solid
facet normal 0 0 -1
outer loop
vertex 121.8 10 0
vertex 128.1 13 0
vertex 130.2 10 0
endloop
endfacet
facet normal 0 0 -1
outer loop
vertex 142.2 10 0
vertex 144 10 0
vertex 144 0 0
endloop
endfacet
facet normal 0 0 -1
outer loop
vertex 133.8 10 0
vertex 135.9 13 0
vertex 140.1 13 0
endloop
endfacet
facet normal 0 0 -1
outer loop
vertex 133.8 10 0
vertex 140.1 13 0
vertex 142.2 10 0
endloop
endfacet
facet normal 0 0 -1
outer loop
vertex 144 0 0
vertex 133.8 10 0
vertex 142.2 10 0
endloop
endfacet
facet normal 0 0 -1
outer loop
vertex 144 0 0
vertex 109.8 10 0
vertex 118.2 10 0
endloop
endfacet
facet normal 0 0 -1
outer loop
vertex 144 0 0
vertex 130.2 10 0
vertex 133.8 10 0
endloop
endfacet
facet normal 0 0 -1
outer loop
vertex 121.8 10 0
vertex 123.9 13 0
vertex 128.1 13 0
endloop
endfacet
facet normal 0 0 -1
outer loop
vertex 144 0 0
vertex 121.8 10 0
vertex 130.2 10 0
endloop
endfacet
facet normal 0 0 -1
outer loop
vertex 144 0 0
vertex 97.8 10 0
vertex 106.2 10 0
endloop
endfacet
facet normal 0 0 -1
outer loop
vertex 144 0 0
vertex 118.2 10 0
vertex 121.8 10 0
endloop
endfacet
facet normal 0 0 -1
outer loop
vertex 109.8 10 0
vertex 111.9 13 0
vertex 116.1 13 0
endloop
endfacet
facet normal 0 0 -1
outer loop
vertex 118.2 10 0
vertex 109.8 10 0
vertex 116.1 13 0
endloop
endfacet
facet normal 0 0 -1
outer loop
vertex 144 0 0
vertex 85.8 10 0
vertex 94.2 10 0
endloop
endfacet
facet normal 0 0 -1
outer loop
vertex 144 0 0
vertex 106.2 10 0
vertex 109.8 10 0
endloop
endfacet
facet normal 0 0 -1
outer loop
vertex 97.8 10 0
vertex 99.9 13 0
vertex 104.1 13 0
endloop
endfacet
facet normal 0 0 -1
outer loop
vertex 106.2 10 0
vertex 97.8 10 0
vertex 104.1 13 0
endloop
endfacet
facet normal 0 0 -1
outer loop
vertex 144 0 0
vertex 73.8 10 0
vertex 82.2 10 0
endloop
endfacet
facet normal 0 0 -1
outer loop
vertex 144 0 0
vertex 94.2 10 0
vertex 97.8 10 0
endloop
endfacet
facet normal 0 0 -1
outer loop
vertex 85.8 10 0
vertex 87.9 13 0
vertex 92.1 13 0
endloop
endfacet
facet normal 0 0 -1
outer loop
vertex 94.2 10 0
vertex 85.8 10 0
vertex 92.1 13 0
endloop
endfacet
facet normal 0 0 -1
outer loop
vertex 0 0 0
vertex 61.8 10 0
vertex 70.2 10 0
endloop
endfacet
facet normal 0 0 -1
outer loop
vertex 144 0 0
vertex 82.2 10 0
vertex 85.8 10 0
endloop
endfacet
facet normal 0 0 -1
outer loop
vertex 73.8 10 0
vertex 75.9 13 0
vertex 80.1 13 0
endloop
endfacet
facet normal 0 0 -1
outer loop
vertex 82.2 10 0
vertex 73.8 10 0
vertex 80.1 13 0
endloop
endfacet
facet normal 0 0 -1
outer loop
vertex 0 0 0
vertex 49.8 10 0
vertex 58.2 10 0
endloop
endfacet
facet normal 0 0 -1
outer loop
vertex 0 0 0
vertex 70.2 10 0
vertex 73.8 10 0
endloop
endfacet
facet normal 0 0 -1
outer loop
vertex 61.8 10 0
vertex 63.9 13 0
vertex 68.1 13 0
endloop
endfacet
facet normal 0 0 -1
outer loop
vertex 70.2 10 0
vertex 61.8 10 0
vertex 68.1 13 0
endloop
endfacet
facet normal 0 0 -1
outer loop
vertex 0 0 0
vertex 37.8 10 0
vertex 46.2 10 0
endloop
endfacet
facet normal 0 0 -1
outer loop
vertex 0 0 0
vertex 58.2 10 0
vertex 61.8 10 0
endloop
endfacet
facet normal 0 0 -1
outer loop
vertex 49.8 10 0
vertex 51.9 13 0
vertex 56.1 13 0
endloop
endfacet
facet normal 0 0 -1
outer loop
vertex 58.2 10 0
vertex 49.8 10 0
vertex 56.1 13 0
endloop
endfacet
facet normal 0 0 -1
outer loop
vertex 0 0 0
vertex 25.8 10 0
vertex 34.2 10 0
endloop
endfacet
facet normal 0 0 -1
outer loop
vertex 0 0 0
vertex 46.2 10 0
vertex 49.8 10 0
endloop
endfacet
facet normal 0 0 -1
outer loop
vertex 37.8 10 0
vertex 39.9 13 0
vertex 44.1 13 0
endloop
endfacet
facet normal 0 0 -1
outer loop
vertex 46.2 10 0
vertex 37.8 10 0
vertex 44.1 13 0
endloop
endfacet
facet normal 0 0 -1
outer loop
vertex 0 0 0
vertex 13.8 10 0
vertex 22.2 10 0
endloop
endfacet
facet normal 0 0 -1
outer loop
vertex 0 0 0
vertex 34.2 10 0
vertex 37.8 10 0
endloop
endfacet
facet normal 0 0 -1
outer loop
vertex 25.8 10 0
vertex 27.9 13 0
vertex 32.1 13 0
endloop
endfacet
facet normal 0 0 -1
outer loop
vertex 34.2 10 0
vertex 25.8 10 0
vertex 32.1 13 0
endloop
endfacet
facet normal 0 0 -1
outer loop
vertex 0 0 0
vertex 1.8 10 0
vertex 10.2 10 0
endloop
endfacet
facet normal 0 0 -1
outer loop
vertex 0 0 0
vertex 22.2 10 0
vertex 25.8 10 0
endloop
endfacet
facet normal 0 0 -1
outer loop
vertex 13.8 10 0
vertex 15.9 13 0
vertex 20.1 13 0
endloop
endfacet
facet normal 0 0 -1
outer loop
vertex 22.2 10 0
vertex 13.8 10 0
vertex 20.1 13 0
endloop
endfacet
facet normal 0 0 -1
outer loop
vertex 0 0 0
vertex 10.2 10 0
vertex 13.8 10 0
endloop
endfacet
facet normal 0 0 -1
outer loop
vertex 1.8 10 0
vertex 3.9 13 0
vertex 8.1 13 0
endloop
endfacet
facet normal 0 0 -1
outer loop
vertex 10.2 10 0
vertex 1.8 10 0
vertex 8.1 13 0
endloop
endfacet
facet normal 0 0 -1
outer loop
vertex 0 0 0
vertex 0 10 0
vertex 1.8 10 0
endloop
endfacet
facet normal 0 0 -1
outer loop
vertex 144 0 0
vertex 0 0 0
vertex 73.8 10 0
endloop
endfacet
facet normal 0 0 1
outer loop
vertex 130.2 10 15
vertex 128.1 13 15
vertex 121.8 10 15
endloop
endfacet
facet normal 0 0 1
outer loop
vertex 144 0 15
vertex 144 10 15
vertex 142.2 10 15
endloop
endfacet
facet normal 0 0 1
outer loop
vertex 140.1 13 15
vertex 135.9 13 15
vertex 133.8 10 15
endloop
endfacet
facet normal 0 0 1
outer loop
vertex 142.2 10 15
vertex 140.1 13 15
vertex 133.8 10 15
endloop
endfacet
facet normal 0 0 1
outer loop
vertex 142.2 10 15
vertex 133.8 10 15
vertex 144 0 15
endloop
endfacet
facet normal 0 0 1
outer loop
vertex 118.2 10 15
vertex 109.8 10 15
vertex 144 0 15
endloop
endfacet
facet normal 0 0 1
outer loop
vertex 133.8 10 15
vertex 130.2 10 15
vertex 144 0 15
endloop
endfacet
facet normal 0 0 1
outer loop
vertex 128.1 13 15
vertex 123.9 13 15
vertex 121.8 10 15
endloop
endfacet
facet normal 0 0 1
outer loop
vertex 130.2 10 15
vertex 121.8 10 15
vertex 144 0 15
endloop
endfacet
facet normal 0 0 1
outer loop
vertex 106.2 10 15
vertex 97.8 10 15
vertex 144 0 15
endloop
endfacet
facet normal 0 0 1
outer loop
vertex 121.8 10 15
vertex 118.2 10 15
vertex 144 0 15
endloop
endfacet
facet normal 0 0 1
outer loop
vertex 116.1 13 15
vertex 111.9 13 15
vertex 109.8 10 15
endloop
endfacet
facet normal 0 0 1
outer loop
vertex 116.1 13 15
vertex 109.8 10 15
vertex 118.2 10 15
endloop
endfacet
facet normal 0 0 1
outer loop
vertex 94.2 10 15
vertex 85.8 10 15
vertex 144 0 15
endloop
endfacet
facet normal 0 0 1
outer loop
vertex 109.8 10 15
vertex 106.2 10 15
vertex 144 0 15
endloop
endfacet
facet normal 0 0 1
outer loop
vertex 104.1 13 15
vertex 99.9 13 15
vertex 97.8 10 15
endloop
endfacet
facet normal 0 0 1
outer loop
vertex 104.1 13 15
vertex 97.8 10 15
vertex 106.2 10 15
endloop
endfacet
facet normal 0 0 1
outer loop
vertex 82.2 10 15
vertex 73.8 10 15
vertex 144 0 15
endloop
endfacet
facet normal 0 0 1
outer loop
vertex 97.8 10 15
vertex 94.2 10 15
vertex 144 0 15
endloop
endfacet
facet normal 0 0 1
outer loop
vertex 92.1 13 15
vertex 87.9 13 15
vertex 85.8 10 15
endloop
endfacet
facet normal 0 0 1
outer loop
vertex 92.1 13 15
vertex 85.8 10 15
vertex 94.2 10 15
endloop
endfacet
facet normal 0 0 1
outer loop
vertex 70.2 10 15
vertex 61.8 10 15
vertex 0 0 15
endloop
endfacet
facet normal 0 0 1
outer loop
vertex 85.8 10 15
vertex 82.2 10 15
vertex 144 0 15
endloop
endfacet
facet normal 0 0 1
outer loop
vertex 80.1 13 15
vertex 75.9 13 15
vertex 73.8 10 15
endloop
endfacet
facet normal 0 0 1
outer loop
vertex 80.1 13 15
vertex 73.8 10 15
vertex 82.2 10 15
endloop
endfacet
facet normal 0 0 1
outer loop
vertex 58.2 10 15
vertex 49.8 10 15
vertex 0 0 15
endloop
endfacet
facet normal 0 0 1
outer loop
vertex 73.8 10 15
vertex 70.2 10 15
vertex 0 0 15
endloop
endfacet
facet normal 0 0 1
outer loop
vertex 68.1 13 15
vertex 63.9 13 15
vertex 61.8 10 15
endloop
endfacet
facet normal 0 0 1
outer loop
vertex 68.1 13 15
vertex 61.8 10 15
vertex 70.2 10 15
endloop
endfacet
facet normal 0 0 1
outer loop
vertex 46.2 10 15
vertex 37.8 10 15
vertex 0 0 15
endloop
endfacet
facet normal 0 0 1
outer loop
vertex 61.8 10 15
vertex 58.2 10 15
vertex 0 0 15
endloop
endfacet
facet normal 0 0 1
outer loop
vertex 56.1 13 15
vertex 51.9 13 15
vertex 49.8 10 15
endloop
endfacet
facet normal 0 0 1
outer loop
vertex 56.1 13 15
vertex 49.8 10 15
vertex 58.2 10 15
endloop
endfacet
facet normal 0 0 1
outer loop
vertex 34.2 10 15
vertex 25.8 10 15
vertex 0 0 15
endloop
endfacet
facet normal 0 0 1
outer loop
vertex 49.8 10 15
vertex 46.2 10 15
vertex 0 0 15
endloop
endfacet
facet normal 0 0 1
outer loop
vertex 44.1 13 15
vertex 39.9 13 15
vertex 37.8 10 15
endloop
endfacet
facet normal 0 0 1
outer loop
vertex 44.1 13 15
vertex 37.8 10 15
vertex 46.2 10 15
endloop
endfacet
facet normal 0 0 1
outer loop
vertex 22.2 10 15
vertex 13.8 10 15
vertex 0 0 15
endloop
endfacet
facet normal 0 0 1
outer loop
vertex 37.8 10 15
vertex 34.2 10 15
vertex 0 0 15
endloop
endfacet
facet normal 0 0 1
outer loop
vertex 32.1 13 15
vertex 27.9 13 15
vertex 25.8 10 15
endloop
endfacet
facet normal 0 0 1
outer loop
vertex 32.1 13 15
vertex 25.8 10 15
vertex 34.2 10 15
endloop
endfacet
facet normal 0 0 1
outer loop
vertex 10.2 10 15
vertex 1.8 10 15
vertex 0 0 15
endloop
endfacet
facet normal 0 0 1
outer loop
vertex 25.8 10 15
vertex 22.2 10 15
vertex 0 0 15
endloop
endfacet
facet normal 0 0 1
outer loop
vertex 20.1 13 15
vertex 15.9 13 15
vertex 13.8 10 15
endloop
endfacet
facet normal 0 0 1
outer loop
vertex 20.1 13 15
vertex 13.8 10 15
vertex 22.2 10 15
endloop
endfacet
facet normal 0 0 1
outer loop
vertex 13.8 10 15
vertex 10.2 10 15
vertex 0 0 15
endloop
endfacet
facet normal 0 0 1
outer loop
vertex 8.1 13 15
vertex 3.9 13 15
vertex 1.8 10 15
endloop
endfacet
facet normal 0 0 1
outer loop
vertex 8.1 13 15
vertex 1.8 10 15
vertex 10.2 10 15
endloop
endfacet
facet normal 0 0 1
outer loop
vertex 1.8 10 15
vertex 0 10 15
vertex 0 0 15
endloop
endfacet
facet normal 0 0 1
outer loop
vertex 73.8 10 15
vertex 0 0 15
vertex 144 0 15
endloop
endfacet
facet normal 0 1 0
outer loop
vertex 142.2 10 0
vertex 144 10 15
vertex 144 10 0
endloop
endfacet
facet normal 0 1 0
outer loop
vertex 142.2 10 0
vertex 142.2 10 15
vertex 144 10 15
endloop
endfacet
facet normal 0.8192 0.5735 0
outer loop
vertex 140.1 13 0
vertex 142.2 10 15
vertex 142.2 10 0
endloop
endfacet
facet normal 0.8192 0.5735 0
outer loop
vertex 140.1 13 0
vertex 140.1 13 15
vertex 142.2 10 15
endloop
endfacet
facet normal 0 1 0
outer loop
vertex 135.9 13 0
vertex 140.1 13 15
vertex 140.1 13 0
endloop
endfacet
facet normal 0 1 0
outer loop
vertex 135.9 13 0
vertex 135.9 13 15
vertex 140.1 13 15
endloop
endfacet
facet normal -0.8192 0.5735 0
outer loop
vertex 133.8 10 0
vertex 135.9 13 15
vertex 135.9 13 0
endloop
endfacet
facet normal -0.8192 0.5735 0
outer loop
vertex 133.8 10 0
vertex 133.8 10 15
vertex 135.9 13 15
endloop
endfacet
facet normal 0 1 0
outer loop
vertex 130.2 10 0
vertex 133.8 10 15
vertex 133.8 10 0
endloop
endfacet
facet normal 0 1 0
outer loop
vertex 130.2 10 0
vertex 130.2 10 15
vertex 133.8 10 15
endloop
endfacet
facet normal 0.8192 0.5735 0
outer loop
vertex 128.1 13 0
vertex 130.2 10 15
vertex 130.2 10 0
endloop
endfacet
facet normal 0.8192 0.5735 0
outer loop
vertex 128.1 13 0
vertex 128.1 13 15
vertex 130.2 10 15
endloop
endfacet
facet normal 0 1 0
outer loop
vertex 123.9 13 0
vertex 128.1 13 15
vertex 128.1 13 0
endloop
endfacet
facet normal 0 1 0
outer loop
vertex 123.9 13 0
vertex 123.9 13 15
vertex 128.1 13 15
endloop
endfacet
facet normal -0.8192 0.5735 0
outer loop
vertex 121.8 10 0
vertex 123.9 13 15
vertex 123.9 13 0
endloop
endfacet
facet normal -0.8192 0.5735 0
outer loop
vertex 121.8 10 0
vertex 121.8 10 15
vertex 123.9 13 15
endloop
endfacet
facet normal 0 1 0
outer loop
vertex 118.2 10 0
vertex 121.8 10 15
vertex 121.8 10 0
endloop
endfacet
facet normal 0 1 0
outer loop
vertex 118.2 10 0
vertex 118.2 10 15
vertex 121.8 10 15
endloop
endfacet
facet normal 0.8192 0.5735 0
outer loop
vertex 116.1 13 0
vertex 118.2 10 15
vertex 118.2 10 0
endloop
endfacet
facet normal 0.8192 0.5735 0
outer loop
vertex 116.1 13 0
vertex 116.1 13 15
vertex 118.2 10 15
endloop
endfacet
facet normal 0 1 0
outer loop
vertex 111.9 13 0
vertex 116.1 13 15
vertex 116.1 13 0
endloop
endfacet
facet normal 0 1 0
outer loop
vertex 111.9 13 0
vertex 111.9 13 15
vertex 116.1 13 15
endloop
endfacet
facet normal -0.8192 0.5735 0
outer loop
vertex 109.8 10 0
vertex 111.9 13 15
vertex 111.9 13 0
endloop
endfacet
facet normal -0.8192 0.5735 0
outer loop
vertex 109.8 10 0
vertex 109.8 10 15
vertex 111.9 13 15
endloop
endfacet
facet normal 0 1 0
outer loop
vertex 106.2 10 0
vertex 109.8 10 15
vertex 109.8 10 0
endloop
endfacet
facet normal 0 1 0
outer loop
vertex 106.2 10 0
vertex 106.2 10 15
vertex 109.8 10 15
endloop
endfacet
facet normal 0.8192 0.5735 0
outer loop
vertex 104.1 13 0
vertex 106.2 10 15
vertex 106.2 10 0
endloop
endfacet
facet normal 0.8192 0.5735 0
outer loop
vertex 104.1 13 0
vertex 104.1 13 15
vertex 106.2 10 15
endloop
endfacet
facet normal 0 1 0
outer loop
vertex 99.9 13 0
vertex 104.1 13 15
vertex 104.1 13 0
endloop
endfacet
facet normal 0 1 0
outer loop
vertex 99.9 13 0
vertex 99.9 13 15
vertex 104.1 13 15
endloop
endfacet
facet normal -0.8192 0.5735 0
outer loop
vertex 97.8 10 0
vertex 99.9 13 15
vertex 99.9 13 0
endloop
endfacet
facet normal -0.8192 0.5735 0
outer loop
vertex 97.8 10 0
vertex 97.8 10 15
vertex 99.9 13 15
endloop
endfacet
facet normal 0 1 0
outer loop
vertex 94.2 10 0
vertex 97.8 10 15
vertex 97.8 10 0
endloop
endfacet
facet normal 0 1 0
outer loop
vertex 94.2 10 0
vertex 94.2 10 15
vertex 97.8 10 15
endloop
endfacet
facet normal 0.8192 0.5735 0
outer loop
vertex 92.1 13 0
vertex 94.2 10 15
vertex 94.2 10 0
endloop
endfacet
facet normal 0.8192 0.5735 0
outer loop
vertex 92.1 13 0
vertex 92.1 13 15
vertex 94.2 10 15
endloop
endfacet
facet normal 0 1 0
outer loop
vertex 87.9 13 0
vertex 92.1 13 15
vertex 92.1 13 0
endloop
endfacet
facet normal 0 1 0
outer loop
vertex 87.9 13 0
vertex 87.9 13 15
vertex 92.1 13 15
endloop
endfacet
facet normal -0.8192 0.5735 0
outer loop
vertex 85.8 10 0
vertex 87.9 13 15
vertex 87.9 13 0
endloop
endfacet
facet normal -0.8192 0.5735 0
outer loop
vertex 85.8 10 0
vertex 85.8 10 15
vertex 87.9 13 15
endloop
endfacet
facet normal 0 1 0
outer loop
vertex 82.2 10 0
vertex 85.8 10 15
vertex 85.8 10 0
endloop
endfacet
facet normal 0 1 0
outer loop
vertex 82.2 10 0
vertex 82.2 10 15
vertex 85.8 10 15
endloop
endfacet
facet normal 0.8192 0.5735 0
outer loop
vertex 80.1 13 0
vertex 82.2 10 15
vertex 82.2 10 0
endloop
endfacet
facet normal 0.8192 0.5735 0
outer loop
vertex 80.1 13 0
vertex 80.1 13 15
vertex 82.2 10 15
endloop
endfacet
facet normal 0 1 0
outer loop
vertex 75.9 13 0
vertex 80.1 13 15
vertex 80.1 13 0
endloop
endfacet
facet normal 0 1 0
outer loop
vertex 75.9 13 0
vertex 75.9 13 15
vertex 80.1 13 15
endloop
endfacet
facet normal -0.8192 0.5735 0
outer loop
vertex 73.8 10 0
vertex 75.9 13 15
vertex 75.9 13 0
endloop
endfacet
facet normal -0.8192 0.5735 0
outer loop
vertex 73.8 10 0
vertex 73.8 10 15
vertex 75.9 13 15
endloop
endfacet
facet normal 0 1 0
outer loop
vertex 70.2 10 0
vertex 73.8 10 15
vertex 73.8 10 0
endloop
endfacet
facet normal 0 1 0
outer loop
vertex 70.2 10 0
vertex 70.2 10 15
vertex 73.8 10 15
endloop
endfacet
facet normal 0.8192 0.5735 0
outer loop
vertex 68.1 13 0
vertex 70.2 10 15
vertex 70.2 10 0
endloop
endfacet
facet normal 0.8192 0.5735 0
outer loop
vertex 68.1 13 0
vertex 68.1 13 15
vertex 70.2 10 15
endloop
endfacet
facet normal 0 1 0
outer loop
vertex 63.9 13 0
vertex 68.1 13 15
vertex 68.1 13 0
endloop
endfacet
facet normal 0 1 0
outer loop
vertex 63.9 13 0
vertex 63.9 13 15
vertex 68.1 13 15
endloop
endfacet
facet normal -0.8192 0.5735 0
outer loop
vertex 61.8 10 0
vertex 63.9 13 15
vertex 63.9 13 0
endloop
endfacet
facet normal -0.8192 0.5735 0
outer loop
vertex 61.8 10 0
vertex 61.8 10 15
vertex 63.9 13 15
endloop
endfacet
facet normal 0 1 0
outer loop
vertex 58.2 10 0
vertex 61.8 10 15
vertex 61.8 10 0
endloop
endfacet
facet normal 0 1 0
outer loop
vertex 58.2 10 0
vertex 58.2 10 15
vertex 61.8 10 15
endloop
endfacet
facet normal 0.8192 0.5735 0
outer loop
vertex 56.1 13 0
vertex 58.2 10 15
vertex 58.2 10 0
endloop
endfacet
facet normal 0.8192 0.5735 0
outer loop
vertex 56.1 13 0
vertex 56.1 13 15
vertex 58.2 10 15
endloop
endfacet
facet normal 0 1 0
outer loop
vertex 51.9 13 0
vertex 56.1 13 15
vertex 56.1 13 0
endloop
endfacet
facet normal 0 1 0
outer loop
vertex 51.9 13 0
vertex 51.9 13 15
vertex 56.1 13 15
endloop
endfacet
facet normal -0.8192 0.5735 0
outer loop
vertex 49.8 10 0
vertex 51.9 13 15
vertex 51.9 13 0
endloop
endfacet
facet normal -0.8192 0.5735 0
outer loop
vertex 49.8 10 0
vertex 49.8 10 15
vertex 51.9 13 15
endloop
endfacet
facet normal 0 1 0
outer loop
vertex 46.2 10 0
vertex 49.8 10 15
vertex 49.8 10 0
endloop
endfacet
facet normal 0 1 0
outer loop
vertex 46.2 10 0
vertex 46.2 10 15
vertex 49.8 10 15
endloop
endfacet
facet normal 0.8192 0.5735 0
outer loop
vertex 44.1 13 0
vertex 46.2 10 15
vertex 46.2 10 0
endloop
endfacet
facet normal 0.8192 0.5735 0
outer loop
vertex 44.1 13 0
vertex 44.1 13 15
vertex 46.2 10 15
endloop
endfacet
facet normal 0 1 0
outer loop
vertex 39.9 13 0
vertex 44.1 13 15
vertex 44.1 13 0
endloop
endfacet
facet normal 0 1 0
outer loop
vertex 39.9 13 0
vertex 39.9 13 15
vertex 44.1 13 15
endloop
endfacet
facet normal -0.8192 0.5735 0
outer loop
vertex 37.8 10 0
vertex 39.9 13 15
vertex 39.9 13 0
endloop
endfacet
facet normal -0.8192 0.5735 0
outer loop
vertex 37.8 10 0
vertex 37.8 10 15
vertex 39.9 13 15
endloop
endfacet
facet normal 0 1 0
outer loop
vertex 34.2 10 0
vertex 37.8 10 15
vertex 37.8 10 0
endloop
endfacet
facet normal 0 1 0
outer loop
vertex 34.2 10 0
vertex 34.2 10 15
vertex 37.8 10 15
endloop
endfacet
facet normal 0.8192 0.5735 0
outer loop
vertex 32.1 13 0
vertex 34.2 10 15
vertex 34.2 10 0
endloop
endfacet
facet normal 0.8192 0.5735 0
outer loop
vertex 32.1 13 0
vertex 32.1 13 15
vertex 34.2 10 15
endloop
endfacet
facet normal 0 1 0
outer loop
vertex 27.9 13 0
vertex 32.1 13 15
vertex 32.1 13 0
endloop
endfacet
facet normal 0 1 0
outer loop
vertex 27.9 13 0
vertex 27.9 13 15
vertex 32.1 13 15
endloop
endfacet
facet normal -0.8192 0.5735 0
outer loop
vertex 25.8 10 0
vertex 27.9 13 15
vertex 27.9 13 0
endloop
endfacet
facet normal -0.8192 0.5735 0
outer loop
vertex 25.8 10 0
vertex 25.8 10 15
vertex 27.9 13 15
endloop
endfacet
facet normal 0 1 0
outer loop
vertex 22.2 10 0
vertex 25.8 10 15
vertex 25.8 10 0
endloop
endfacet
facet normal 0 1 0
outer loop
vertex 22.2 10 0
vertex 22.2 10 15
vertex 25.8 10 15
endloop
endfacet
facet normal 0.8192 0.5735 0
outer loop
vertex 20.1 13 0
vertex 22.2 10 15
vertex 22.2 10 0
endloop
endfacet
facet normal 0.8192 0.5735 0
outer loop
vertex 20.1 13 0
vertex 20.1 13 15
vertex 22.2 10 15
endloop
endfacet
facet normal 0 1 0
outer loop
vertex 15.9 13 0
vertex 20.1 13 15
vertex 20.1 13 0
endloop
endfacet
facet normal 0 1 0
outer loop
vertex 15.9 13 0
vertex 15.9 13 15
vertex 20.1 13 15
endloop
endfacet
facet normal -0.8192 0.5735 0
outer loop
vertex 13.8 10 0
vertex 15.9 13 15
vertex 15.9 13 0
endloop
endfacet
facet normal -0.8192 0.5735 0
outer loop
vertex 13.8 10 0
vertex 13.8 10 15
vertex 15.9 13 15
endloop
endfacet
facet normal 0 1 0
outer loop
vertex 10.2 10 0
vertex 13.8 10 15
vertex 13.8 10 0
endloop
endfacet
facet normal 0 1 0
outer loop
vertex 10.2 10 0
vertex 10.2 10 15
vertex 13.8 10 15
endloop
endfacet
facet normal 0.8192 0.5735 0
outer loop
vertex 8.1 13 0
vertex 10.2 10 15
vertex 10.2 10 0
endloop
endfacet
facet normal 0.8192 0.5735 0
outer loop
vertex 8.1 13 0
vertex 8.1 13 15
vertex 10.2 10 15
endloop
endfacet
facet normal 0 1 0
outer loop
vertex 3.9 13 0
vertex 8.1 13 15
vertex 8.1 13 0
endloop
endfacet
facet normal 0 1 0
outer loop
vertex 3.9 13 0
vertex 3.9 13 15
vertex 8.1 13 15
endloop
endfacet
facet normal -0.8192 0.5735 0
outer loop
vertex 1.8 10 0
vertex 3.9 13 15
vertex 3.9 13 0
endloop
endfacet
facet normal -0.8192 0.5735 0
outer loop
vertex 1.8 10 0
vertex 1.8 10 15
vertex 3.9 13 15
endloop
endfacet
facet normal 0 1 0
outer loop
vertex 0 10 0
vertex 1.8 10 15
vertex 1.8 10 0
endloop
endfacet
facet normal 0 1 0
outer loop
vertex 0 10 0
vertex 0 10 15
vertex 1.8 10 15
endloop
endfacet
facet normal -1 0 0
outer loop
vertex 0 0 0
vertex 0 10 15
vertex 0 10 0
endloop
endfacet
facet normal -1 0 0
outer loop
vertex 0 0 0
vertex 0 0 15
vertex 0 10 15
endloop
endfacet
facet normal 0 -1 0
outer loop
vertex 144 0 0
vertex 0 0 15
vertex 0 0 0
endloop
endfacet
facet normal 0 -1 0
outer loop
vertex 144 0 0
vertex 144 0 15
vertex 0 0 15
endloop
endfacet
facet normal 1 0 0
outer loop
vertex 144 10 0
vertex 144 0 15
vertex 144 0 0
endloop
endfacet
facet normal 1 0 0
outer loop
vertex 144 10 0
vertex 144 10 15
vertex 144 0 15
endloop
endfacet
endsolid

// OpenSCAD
$fn = 32;

// ----------------------------------------------------------------------
// Gear rack: 12 teeth, pitch 12 mm
// ----------------------------------------------------------------------

// --- parameters (mm) ---
teeth = 12;               // number of teeth
pitch = 12;               // tooth pitch, X
root_w = 8.4;             // tooth width at the root
tip_w = 4.2;              // tooth width at the tip
base_h = 10;              // rack body height, Y
tooth_h = 3;              // tooth height above the body
plate_t = 15;             // rack width, Z (extrusion height)

rack_l = teeth * pitch;  // overall length
total_h = base_h + tooth_h;  // overall height

profile = [[0, 0], [144, 0], [144, 10], [142.2, 10], [140.1, 13], [135.9, 13], [133.8, 10], [130.2, 10], [128.1, 13], [123.9, 13], [121.8, 10], [118.2, 10], [116.1, 13], [111.9, 13], [109.8, 10], [106.2, 10], [104.1, 13], [99.9, 13], [97.8, 10], [94.2, 10], [92.1, 13], [87.9, 13], [85.8, 10], [82.2, 10], [80.1, 13], [75.9, 13], [73.8, 10], [70.2, 10], [68.1, 13], [63.9, 13], [61.8, 10], [58.2, 10], [56.1, 13], [51.9, 13], [49.8, 10], [46.2, 10], [44.1, 13], [39.9, 13], [37.8, 10], [34.2, 10], [32.1, 13], [27.9, 13], [25.8, 10], [22.2, 10], [20.1, 13], [15.9, 13], [13.8, 10], [10.2, 10], [8.1, 13], [3.9, 13], [1.8, 10], [0, 10]];  // primary outline, 52 points, counter clockwise

// --- the one profile operation ---
linear_extrude(height = plate_t) polygon(points = profile);
